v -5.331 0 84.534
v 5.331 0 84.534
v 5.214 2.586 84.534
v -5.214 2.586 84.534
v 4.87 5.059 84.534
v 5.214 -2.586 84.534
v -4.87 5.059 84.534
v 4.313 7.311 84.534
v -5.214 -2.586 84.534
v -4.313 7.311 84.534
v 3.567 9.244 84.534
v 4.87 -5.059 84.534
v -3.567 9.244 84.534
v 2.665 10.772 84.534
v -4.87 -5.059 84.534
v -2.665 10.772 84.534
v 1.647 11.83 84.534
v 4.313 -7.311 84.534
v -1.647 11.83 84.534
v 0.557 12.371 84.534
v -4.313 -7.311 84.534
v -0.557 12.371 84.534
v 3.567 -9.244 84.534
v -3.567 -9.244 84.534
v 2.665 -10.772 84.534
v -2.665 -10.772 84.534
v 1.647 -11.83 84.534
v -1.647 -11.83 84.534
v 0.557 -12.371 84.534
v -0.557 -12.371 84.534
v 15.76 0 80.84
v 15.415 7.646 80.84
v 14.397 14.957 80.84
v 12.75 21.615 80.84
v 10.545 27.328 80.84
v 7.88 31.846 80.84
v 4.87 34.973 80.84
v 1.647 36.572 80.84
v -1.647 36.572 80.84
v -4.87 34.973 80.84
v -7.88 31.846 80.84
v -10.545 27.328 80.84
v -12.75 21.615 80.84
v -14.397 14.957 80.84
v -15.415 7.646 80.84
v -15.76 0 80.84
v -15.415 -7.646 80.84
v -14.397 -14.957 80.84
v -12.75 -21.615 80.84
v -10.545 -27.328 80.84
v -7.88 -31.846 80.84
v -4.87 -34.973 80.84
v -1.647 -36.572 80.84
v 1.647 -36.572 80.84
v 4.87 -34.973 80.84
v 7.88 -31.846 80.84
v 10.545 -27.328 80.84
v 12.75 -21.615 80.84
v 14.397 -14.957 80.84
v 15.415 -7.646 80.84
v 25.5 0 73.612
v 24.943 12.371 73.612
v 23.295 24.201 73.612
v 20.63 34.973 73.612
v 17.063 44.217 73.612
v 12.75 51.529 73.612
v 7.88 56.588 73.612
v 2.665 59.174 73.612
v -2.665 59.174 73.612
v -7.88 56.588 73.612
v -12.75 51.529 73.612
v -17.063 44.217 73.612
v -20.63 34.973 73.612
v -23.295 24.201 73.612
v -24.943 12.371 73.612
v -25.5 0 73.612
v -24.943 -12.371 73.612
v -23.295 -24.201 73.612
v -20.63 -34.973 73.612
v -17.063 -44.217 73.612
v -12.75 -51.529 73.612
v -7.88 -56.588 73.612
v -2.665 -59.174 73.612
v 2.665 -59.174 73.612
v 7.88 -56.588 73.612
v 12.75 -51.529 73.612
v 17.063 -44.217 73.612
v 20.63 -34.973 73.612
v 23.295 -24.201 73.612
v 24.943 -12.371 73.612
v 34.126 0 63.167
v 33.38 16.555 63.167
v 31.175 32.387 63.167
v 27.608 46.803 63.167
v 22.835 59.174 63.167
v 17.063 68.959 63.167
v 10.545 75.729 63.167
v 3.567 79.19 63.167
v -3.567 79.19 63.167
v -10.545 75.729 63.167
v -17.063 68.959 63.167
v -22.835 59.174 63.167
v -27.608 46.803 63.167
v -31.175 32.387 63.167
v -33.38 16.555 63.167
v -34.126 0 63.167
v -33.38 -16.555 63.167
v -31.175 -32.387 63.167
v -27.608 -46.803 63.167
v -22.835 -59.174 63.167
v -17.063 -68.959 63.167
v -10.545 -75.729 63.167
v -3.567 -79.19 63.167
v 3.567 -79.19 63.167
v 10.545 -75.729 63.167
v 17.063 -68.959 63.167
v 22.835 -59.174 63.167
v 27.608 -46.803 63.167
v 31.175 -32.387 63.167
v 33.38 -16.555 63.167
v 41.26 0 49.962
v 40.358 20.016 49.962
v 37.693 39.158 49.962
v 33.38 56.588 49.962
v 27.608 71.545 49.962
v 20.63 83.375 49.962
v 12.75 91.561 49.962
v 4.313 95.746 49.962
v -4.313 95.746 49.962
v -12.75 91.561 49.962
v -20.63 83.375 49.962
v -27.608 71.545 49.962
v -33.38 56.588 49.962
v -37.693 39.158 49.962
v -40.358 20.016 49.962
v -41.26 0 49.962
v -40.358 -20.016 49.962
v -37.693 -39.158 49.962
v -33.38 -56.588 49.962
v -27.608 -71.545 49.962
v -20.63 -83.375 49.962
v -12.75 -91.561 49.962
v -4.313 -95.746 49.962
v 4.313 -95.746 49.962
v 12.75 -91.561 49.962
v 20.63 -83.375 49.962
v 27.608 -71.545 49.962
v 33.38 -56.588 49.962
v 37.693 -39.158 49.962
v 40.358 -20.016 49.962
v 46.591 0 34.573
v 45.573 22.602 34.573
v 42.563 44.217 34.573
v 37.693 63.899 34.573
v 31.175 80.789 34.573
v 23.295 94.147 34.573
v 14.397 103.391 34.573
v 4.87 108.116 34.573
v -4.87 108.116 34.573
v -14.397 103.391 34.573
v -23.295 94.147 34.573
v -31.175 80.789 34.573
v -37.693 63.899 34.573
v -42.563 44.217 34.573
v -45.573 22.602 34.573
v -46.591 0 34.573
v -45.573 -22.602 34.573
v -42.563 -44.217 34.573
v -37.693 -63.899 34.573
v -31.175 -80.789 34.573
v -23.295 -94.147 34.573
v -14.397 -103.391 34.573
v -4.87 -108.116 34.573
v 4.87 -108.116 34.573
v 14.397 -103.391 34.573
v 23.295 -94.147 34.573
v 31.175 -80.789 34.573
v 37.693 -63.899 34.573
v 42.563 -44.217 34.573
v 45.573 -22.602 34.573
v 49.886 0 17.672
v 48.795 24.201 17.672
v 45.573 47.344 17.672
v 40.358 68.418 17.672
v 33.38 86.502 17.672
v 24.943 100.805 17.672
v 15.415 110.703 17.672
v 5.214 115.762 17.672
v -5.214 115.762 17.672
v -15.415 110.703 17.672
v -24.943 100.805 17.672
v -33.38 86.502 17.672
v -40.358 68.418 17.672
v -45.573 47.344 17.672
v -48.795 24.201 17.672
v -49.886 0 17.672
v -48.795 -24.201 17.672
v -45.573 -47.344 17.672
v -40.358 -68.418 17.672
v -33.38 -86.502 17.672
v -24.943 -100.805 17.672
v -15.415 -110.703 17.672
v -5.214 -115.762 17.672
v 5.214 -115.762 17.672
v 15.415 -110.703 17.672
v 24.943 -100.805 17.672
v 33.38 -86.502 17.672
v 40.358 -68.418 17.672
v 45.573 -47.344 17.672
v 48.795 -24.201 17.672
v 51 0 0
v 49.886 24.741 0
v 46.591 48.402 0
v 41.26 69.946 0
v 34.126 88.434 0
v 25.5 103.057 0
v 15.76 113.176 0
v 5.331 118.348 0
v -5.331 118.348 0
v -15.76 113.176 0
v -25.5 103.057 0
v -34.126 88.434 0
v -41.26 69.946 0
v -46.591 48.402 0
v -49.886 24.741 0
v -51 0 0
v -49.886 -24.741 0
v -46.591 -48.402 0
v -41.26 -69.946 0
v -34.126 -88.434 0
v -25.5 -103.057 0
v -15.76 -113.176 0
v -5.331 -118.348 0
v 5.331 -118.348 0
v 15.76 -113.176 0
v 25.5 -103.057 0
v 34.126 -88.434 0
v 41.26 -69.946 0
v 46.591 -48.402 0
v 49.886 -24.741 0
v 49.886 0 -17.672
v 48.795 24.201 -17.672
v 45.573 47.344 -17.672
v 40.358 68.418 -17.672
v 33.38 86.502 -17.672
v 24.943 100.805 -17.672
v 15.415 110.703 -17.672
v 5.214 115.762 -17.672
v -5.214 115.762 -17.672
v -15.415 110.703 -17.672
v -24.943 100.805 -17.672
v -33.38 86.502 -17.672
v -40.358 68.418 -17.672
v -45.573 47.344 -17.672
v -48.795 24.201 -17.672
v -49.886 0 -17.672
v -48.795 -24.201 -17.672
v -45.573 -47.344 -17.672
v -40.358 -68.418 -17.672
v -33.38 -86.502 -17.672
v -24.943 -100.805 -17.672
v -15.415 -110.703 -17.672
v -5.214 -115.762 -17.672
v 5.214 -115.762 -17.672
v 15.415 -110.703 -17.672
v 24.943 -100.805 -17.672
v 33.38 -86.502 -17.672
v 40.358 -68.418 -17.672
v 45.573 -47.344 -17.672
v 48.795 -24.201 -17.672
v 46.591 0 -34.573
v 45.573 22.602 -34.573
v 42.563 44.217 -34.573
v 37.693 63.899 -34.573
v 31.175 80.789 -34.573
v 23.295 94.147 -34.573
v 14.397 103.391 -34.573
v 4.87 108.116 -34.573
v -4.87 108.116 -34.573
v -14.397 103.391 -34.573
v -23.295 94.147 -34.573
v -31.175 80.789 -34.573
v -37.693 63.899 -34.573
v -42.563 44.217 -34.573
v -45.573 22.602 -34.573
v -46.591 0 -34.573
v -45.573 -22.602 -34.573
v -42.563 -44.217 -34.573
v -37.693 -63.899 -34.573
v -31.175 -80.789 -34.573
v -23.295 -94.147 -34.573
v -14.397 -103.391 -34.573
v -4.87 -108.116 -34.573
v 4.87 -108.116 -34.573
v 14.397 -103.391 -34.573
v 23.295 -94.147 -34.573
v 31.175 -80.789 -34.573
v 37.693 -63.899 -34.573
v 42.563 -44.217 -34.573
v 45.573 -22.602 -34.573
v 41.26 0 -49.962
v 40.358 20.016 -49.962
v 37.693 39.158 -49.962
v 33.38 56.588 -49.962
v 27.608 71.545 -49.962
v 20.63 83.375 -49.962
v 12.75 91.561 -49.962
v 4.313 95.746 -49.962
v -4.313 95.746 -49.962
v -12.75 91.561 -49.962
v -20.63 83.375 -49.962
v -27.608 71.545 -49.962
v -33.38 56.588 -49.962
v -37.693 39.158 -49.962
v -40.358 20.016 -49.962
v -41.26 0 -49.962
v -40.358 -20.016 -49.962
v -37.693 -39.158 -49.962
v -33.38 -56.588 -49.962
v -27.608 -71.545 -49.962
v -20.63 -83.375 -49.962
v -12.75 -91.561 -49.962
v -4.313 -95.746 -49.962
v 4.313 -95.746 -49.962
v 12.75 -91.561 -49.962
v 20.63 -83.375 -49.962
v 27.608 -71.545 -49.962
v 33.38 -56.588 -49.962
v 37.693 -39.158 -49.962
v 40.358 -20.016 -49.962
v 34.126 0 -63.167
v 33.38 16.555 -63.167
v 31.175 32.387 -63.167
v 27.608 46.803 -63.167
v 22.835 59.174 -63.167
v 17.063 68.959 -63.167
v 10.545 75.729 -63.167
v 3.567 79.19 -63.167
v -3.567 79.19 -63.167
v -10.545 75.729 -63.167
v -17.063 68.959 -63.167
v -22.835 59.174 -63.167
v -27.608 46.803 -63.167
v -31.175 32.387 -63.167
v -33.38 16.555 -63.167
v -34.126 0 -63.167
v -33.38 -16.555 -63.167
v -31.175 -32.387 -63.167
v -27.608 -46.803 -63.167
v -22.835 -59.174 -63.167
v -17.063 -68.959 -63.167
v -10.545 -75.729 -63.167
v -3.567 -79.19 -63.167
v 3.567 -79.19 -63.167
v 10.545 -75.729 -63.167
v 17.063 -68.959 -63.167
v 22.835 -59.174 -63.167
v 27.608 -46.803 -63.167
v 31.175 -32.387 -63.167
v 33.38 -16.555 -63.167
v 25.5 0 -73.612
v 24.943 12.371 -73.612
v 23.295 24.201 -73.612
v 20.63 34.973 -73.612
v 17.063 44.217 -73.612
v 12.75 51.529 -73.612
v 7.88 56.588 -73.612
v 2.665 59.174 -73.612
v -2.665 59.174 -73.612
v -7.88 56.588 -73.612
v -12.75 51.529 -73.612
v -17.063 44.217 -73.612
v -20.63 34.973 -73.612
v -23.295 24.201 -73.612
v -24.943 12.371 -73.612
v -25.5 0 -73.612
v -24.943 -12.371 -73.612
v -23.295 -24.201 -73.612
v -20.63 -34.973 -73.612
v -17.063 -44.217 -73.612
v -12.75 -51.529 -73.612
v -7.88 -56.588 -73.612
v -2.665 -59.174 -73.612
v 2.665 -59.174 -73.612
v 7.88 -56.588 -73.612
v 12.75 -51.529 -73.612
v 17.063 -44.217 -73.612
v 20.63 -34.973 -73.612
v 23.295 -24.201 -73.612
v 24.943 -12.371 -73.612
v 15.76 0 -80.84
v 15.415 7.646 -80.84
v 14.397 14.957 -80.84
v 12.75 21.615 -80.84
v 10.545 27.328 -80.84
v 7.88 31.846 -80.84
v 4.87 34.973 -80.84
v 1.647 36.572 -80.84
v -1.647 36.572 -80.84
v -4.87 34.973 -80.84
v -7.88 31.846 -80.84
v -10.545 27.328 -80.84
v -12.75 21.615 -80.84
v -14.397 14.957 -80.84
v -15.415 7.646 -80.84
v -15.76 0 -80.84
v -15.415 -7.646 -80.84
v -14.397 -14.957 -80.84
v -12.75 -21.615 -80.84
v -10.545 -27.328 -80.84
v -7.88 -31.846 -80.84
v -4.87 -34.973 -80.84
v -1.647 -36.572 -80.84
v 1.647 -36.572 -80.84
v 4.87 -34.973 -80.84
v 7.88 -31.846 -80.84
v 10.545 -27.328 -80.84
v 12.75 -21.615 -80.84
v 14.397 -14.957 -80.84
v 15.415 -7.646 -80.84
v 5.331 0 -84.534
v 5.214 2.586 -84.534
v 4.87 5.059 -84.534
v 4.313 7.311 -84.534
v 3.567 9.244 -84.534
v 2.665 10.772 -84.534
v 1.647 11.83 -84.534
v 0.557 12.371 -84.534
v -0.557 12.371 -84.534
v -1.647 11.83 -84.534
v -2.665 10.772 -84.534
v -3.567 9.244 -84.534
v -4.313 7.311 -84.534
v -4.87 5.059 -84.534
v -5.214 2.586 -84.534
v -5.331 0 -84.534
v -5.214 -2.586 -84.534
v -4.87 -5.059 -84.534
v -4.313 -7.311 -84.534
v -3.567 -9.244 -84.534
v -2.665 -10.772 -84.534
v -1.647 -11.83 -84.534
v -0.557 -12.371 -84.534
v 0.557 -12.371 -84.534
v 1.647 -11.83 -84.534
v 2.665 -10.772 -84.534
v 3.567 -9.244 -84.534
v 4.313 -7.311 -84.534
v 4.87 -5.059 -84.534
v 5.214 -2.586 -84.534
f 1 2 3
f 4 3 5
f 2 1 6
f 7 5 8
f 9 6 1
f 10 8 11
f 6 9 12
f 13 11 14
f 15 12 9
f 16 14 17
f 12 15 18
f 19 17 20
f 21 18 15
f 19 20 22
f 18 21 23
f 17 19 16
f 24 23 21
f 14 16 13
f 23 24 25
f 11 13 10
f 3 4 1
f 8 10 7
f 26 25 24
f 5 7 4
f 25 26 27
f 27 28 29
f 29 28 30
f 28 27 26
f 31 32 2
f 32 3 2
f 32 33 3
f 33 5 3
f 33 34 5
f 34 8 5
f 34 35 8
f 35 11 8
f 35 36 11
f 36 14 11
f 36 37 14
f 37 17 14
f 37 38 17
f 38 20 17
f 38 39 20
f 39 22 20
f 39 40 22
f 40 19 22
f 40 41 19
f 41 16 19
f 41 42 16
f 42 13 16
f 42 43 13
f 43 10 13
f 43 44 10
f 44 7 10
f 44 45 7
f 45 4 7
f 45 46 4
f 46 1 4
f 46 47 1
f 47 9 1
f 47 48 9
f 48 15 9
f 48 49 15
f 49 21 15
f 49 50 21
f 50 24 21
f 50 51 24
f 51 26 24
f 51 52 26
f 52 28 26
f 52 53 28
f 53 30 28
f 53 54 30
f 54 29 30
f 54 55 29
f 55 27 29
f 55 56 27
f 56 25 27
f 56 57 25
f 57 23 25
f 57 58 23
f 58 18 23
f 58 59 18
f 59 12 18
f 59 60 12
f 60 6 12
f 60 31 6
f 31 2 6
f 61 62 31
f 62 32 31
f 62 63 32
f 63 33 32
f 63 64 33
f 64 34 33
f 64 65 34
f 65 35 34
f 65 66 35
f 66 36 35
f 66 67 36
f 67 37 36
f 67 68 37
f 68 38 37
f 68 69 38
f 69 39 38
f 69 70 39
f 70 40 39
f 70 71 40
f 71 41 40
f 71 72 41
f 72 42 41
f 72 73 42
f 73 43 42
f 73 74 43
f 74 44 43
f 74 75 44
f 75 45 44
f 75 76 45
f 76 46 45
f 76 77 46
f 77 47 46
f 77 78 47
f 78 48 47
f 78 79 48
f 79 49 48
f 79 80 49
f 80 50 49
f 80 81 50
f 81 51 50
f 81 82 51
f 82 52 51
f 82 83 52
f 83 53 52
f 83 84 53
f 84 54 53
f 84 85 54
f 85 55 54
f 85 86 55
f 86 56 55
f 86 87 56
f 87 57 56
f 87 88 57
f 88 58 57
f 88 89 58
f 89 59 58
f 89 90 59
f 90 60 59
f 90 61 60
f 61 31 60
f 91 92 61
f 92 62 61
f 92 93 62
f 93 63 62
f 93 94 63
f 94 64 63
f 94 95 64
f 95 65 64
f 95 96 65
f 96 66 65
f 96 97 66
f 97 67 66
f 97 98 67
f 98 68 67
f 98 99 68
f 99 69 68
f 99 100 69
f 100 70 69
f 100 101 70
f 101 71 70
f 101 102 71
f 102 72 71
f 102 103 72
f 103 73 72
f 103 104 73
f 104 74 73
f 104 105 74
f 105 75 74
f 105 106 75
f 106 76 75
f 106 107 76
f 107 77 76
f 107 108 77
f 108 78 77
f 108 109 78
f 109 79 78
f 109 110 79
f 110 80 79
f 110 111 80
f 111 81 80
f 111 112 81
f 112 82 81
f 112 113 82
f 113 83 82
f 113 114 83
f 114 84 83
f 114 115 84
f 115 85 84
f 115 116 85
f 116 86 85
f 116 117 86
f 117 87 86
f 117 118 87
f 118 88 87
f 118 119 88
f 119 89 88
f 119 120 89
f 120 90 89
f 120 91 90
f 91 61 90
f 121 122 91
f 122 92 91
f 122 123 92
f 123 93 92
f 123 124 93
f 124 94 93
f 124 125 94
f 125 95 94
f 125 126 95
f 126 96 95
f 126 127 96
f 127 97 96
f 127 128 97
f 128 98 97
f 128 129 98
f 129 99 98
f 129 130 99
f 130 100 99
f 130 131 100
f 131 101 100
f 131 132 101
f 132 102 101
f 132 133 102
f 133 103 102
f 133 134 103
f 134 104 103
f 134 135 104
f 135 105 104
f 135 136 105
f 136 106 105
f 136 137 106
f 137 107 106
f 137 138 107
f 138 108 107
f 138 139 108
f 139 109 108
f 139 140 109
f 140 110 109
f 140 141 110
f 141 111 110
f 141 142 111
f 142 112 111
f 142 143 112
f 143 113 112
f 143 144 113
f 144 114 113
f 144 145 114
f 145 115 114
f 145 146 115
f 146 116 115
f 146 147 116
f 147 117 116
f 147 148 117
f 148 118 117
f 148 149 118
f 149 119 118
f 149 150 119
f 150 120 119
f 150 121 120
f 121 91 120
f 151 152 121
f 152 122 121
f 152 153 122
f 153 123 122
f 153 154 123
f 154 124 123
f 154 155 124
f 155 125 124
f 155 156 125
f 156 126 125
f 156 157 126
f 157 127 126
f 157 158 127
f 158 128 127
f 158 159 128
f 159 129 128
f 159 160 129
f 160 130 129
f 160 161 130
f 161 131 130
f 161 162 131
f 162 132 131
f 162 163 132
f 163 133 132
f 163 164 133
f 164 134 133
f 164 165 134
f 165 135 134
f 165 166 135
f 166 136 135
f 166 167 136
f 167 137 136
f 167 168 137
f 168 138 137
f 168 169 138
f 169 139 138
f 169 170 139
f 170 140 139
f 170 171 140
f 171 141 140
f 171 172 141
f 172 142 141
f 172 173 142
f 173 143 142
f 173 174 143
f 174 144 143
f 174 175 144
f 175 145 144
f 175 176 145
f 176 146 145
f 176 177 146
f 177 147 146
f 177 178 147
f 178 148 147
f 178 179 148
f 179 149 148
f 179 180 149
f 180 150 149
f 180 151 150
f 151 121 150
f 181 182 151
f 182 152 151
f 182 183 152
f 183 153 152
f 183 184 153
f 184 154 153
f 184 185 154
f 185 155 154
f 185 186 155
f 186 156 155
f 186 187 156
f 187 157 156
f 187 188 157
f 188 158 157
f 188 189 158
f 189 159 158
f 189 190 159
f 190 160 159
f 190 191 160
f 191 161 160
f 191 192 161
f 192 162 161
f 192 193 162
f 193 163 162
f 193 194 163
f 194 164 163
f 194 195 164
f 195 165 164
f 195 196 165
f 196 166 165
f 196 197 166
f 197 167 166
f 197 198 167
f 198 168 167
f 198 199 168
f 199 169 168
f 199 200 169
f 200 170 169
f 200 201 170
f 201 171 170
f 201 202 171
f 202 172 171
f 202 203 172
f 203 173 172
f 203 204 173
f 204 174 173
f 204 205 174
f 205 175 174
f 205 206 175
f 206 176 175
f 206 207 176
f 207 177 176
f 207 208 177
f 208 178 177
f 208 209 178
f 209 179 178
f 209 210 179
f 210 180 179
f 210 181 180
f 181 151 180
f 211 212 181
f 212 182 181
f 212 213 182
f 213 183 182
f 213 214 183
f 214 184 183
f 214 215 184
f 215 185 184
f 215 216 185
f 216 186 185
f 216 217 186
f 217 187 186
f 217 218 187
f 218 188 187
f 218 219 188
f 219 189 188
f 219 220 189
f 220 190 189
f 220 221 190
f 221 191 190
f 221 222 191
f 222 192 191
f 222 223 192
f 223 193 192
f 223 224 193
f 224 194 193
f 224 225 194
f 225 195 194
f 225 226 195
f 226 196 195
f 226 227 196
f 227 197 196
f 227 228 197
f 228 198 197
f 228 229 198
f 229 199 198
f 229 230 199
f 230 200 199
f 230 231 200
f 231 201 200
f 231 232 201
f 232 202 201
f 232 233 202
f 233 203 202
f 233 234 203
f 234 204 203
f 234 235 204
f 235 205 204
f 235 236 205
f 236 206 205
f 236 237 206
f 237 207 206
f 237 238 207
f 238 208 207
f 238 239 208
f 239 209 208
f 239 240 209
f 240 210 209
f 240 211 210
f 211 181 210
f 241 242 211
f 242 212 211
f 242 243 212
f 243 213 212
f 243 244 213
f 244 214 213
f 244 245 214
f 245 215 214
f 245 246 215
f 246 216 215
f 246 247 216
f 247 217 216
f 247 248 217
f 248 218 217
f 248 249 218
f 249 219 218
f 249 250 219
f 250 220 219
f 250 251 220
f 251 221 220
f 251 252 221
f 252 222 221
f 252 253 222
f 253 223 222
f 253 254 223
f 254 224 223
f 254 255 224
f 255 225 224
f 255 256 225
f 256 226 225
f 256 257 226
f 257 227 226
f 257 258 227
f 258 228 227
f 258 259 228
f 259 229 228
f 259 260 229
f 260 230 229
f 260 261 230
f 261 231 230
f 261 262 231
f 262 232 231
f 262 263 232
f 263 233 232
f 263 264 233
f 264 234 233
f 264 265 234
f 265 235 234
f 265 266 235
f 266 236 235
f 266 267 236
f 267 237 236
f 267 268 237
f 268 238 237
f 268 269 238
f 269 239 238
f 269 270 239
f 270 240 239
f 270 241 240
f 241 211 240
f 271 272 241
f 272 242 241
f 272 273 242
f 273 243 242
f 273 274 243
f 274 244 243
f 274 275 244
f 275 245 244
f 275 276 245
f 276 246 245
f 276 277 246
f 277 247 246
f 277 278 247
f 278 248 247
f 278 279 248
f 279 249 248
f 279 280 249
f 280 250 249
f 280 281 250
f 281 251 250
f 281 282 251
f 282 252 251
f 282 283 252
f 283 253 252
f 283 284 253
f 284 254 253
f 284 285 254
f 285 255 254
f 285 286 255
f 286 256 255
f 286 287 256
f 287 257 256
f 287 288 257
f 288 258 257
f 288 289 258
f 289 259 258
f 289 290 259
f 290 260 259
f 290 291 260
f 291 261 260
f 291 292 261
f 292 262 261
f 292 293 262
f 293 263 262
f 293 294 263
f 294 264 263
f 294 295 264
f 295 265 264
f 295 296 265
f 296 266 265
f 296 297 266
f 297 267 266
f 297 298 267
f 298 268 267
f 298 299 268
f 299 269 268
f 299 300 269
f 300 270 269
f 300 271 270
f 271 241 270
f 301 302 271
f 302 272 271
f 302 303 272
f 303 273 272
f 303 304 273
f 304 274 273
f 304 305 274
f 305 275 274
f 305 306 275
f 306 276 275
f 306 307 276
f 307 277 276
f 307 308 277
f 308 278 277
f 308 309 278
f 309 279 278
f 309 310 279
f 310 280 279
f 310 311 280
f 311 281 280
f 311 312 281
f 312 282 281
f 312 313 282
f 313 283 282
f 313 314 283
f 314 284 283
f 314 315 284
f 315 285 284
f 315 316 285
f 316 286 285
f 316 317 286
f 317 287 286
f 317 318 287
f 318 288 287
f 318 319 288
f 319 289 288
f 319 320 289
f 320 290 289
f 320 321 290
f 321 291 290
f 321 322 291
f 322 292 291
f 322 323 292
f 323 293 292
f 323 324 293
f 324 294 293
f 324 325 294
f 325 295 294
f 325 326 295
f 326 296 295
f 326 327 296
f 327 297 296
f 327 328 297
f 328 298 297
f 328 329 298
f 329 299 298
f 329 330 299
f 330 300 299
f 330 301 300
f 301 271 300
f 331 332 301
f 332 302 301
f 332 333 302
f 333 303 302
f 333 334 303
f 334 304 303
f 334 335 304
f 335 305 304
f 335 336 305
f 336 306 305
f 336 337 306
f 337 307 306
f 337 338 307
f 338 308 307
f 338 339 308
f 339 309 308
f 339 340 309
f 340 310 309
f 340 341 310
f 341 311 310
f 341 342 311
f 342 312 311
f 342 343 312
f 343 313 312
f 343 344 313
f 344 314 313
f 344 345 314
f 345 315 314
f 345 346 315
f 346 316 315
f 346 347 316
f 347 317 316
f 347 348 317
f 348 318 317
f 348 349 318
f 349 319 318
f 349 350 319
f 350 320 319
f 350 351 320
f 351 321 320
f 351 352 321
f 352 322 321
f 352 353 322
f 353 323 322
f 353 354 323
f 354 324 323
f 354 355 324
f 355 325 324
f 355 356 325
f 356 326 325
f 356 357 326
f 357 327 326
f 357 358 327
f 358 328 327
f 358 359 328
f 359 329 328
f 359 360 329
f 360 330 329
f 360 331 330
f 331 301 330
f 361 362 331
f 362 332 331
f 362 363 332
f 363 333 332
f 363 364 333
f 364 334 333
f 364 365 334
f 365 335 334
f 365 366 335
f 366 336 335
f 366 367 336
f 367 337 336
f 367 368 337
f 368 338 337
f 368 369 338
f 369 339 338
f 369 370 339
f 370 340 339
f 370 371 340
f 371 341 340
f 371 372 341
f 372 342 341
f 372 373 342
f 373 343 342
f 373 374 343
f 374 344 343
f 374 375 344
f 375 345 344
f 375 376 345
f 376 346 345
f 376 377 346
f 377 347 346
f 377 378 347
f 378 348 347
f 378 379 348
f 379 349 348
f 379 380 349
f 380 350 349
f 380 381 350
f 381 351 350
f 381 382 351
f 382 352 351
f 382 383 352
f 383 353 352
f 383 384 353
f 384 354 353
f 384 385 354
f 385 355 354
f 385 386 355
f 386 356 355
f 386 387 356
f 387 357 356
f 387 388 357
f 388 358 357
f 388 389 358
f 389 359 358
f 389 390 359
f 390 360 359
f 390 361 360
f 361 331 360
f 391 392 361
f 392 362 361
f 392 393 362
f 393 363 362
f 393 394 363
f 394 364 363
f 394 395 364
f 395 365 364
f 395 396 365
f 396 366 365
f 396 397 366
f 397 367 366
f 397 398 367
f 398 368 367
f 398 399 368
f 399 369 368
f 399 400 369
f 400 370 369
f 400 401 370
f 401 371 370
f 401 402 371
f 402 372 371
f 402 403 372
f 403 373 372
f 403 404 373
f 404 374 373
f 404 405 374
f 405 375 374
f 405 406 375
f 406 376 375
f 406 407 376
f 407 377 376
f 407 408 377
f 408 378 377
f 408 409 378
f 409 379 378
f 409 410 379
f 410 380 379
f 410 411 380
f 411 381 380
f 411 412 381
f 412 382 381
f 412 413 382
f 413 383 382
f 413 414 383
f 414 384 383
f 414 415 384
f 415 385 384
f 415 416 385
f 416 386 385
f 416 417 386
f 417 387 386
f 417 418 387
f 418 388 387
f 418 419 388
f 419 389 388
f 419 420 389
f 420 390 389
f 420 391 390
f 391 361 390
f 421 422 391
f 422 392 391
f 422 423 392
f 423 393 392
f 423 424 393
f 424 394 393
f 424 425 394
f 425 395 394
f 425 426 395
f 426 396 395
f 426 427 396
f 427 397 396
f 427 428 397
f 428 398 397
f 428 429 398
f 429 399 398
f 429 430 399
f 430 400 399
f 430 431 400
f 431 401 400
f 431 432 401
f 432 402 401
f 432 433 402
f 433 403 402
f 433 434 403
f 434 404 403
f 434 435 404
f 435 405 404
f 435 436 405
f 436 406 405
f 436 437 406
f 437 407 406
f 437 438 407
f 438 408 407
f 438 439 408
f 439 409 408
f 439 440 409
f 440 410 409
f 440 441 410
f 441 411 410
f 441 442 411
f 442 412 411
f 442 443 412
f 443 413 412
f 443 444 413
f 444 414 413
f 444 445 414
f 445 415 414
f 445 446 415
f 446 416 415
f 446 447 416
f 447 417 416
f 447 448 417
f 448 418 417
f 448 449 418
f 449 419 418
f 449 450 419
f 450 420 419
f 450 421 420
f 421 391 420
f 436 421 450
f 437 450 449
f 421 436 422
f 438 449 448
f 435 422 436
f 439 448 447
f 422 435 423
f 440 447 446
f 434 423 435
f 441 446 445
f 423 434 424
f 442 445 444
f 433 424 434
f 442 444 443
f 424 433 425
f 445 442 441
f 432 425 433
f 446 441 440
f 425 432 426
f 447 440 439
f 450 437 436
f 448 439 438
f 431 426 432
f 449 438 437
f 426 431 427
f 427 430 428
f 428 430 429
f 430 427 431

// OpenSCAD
// Generated by SolidPython 1.0.1 on 2020-07-29 00:46:45


scale(v = [3, 7, 5]) {
	sphere(r = 17);
}
/***********************************************
*********      SolidPython code:      **********
************************************************
 
# import packages: SolidPython
from solid import *
from solid.utils import *
from itertools import chain, combinations, permutations


class Resize:

    def __init__(self, scad_file):
        self.scad_file = scad_file
        #self.scad_file = import_scad(scad_file)
        # cone/cylinder param:
        self.r1 = 0
        self.r2 = 0
        self.h = 0
        # rectangular prism param:
        self.w = 0
        self.l = 0
        # ellipse param:
        self.r = 0

    # import OpenScad code (file name corresponds to shape)


    # classify shape + parameters
    def assign(self, param1, param2, param3):
        if self.scad_file == 'cone.scad':
            self.r1 = param1
            self.r2 = param2
            self.h = param3
        elif self.scad_file == 'cylinder.scad':
            self.r1 = param1
            self.r2 = param2
            self.h = param3
        elif self.scad_file == 'rectangularPrism.scad':
            self.h = param1
            self.l = param2
            self.w = param3
        else:
            self.r = param1
            self.h = param2

    # resize parameters
    def iterate(self):
        x = range(3, 20, 2)
        i = 1
        if self.scad_file == 'cone.scad':
            tempList = list(permutations(x, 2))
            for temp in tempList:
                param1 = temp[0]
                param2 = temp[1]
                filepath = 'produced_scad_files/' + 'cone' + str(param1) + '_' + str(param2) + '_' + '.scad'
                scad_render_to_file(cylinder(h=param1, r1=param2, r2=0), filepath)

        elif self.scad_file == 'cylinder.scad':
            tempList = list(permutations(x, 3))
            for temp in tempList:
                param1 = temp[0]
                param2 = temp[1]
                filepath = 'produced_scad_files/' + 'cylinder' + str(param1) + '_' + str(param2) + '_' + '.scad'
                scad_render_to_file(cylinder(h=param1, r1=param2, r2=param2), filepath)

        elif self.scad_file == 'rectangularPrism.scad':
            tempList = list(permutations(x, 3))
            for temp in tempList:
                param1 = temp[0]
                param2 = temp[1]
                param3 = temp[2]
                filepath = 'produced_scad_files/' + 'rectangularPrism' + str(param1) + '_' + str(param2) + '_' + str(
                    param3) + '.scad'
                scad_render_to_file(cube(size=(param1, param2, param3)), filepath)

        elif self.scad_file == 'ellipse.scad':
            tempList = list(permutations(x, 4))
            for temp in tempList:
                param1 = temp[0]
                param2 = temp[1]
                param3 = temp[2]
                param4 = temp[3]
                filepath = 'produced_scad_files/' + 'ellipse' + str(param1) + '_' + str(param2) + '_' + str(param3) + '_' + str(param4) + '.scad'
                scad_render_to_file(scale([param1, param2, param3])(sphere(r=param4)), filepath)

    def render_to_scadfile(self):
        scad_render_to_file(scad, 'example.scad') 
 
************************************************/
